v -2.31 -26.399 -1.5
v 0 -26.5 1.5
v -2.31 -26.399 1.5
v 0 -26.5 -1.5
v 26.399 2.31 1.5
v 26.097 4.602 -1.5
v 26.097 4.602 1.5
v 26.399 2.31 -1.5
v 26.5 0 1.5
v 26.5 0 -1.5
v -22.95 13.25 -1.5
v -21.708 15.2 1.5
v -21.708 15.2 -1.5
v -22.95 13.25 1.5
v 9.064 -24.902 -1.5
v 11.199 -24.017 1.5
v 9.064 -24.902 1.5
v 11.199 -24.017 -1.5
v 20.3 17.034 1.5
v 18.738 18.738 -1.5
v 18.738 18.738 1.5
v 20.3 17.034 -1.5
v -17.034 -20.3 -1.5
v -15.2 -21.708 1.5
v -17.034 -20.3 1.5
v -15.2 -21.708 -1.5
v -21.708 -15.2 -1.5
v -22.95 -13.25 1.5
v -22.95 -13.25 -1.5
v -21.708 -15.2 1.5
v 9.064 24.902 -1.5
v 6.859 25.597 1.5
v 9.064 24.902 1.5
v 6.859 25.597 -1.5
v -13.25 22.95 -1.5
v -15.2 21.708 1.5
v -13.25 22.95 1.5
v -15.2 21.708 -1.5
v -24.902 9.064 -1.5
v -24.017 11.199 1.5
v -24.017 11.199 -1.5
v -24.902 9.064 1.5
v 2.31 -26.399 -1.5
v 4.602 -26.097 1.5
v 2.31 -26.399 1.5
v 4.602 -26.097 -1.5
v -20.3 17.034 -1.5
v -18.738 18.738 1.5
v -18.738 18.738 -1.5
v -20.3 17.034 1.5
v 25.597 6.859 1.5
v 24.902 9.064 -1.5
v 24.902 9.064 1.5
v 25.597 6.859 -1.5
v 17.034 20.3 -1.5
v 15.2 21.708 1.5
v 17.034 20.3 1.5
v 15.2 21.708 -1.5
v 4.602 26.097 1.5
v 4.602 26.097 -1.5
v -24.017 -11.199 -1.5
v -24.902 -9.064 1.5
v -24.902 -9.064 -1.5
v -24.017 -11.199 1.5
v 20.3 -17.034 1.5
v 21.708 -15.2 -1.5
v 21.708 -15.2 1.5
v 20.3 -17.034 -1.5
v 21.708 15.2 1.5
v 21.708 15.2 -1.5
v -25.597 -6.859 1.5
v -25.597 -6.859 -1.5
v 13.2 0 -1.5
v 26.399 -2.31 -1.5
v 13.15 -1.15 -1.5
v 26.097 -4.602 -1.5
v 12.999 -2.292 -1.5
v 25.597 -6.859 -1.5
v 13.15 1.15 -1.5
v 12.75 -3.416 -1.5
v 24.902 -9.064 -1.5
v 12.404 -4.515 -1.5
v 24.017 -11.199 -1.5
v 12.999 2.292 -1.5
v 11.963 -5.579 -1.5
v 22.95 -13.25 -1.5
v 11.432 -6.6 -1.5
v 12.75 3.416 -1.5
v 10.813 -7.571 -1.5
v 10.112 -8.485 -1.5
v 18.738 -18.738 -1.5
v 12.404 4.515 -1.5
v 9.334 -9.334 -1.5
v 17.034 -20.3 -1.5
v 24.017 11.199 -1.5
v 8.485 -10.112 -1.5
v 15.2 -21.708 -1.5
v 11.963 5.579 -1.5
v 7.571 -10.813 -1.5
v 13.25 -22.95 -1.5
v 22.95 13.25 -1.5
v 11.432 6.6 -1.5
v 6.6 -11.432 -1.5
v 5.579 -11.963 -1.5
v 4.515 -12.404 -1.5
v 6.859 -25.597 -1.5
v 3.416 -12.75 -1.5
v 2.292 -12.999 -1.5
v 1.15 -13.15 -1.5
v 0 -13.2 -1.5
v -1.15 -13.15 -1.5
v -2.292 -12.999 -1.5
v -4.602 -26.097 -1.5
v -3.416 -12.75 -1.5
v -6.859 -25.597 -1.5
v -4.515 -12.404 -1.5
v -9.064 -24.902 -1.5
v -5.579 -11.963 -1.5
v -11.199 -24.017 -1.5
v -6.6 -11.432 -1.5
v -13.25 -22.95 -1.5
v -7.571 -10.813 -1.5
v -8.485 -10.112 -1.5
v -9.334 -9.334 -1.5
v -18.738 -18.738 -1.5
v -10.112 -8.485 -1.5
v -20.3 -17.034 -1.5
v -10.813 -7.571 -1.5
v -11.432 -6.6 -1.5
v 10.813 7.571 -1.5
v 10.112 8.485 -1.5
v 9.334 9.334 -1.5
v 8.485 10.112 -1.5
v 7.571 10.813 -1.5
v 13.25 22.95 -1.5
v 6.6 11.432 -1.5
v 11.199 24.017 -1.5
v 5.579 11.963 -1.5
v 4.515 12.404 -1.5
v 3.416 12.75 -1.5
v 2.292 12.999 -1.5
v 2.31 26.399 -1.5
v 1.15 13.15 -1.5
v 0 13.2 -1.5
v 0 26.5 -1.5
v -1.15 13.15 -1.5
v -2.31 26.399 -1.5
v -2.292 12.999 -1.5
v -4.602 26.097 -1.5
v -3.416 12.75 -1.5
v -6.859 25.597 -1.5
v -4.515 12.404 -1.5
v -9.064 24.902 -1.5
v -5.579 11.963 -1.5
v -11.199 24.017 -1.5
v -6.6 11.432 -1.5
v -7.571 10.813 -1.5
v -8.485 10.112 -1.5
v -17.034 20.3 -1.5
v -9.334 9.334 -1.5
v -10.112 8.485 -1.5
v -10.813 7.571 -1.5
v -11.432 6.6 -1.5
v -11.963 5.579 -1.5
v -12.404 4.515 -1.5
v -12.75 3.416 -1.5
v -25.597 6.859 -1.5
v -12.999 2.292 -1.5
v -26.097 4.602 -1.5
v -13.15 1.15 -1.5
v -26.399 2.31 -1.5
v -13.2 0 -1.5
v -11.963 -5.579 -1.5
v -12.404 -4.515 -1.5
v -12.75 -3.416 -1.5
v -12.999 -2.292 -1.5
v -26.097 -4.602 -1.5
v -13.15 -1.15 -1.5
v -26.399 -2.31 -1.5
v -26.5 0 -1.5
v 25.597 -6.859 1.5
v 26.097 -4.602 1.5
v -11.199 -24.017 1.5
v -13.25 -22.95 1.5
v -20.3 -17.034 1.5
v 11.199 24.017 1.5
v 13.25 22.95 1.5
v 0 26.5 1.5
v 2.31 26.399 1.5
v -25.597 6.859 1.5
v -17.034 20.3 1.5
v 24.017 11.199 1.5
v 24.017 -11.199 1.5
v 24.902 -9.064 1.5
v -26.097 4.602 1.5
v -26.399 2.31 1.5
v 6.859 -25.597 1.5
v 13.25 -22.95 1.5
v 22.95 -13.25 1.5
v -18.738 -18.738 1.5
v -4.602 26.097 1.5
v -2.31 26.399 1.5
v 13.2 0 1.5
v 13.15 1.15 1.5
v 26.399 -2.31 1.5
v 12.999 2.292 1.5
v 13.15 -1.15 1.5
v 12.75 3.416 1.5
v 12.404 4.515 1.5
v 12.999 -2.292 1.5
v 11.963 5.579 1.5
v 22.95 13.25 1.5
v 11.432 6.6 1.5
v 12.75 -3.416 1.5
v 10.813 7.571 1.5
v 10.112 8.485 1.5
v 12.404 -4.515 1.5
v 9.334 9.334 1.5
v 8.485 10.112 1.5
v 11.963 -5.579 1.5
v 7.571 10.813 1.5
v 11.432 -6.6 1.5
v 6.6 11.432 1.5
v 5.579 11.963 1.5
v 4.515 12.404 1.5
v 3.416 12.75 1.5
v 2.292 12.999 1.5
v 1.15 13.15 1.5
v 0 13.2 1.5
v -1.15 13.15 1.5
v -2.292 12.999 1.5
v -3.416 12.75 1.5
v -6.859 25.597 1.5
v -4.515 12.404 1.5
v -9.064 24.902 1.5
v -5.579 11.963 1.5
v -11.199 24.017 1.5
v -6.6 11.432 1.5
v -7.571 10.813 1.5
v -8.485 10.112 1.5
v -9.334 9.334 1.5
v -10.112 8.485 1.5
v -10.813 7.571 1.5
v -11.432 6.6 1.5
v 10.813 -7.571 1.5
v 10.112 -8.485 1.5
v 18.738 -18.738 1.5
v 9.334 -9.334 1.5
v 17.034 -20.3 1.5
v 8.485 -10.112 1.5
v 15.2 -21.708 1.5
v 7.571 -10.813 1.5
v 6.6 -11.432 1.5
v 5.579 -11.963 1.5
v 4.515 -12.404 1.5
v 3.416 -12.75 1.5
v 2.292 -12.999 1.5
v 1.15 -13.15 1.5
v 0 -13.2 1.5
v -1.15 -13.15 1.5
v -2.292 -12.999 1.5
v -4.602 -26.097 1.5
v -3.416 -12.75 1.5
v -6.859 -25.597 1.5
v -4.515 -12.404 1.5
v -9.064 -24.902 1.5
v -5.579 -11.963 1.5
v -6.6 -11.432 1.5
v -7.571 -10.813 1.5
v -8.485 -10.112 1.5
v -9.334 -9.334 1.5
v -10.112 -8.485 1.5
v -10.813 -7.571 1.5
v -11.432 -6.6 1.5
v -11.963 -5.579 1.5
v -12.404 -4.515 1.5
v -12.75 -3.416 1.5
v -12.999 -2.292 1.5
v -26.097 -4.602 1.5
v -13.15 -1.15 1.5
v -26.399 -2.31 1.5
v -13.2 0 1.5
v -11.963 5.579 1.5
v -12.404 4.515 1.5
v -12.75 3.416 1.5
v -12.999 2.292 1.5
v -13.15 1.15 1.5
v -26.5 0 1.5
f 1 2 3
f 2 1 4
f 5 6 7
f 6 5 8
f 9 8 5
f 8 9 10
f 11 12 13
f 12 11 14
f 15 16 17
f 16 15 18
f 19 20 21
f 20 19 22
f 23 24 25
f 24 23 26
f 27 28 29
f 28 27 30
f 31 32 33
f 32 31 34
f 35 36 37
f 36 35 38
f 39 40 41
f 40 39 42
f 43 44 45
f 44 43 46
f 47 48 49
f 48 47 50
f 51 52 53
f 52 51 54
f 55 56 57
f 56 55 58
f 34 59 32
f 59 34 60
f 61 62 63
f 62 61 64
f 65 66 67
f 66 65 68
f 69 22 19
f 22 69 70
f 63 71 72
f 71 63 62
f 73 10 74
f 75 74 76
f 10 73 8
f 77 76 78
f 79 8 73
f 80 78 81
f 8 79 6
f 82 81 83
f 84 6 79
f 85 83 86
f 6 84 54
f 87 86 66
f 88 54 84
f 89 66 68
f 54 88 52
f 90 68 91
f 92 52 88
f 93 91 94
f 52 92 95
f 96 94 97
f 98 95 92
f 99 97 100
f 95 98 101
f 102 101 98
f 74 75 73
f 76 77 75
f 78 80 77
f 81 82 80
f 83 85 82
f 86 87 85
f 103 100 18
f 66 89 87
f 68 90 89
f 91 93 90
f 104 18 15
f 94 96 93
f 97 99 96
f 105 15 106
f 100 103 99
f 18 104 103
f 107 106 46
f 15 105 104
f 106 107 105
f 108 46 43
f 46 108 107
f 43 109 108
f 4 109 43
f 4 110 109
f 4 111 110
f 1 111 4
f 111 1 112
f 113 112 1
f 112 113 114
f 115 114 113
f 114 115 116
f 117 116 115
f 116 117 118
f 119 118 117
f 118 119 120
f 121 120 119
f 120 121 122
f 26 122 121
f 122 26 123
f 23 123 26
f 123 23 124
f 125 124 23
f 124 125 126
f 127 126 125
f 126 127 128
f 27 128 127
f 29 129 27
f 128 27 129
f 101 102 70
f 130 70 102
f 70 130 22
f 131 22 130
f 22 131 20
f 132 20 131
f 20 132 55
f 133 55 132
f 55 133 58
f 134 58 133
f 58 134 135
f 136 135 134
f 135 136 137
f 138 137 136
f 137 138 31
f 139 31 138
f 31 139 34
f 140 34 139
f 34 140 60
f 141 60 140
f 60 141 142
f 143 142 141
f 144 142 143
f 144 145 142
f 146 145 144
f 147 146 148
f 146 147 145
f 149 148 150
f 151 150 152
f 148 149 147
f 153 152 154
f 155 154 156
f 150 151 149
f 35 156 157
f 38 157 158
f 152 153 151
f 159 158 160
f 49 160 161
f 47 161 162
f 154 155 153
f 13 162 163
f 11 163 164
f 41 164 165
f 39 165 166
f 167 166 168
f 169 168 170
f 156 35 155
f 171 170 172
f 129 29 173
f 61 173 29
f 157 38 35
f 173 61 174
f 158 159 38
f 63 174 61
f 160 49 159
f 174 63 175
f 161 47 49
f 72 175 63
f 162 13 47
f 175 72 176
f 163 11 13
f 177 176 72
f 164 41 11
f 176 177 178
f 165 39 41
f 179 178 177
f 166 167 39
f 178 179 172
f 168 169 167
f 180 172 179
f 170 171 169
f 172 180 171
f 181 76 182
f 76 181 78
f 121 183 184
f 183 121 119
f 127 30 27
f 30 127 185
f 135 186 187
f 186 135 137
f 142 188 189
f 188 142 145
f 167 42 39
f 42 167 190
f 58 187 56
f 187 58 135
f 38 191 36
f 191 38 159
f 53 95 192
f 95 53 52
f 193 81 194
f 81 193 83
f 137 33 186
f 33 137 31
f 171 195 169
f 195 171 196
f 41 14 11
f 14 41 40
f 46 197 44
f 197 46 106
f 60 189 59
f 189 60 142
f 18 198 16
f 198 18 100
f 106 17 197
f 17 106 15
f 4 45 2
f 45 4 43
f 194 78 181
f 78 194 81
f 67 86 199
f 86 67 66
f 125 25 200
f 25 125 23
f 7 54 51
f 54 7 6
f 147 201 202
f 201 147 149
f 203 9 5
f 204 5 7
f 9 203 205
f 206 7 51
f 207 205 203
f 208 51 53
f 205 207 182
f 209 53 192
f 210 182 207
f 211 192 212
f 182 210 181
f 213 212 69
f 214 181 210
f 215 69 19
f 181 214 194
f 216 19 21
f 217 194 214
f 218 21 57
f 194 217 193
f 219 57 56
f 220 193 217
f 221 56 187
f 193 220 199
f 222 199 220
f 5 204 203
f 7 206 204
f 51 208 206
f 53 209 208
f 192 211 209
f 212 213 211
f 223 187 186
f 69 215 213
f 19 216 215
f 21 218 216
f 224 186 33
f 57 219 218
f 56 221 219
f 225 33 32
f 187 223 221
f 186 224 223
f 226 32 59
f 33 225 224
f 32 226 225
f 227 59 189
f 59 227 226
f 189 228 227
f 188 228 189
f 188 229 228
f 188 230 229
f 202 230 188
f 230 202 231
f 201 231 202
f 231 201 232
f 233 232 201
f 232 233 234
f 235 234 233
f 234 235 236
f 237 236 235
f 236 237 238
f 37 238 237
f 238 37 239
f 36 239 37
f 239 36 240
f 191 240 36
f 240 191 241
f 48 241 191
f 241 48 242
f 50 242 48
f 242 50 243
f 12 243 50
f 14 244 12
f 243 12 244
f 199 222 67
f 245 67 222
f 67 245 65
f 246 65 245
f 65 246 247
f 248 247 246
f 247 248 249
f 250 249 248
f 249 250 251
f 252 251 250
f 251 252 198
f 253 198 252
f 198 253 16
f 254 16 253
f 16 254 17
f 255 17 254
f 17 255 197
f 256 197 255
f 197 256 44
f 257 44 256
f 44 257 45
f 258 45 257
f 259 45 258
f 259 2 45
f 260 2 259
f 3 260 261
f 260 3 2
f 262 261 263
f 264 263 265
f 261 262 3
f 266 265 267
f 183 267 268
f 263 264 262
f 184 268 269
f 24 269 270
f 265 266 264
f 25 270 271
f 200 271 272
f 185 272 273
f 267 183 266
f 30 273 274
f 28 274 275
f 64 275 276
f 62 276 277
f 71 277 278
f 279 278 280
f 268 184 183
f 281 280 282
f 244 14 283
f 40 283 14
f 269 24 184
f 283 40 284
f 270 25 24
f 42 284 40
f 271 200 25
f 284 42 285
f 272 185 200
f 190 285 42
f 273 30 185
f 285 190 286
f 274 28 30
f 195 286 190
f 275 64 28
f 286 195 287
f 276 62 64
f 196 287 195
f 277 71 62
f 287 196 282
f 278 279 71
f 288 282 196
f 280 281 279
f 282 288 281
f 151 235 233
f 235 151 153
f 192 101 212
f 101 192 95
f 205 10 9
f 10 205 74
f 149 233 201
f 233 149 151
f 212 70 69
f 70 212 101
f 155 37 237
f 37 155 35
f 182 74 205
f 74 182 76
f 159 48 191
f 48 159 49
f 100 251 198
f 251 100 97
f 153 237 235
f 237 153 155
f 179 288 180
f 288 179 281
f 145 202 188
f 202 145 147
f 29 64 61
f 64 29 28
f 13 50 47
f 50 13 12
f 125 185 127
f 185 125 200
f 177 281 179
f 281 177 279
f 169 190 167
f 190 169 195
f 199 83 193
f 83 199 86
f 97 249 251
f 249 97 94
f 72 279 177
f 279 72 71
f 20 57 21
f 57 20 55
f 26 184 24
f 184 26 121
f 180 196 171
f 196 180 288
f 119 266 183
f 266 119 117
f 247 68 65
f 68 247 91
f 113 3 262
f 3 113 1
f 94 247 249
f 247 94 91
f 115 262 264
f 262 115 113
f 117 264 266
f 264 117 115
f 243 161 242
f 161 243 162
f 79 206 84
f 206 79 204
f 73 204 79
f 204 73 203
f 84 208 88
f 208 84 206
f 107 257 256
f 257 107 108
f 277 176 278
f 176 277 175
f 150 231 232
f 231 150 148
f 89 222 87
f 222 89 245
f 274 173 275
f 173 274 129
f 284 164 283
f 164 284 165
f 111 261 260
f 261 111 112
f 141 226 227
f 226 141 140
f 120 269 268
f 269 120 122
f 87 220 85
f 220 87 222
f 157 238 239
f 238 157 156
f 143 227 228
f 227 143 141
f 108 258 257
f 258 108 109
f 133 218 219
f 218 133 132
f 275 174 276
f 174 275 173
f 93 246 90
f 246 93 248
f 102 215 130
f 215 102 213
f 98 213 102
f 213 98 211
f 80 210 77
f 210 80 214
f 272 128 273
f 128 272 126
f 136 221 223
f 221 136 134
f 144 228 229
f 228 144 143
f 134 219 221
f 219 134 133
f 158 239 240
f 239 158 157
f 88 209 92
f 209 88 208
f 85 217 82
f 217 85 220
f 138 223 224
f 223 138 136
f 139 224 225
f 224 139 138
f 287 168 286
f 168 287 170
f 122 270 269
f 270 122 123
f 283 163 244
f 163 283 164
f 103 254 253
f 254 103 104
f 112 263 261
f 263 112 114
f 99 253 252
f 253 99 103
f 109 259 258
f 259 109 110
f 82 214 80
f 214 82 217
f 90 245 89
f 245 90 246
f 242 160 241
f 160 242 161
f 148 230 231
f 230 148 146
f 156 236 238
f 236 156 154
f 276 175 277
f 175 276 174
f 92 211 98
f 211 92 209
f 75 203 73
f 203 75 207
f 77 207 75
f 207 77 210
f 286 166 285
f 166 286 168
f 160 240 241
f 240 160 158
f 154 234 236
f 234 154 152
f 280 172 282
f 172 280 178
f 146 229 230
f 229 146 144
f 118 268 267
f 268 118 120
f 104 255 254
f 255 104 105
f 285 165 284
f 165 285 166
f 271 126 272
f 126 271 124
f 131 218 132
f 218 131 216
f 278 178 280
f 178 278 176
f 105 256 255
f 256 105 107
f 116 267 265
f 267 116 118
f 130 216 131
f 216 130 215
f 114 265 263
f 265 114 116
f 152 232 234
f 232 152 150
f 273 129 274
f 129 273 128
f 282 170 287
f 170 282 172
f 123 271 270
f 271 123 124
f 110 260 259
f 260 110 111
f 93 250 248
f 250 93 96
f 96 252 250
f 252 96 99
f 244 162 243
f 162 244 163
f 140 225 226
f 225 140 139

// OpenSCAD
// Sunshade upper clip
//
// Copyright (C) 2019 Jeremy Bennett <www.jeremybennett.com>
// Contributor: Jeremy Bennett <jeremy.bennett@embecosm.com>
//
// SPDX-License-Identifier: CC-BY-SA-4.0

// A test disc for pole fit.

// The 3D printer is calibrated so that X-Y are around 2% too small, sizes are
// adjusted accordingly

POLE_R = 26.4 / 2.0;		// Actual 25.3, plus 0.25 gap each side
INNER_R = 53.0 / 2.0;		// 2% is about enough for easy play each side

difference () {
     cylinder (r = INNER_R, h = 3, center = true, $fn = 72);
     cylinder (r = POLE_R, h = 5, center = true, $fn = 72);
}
